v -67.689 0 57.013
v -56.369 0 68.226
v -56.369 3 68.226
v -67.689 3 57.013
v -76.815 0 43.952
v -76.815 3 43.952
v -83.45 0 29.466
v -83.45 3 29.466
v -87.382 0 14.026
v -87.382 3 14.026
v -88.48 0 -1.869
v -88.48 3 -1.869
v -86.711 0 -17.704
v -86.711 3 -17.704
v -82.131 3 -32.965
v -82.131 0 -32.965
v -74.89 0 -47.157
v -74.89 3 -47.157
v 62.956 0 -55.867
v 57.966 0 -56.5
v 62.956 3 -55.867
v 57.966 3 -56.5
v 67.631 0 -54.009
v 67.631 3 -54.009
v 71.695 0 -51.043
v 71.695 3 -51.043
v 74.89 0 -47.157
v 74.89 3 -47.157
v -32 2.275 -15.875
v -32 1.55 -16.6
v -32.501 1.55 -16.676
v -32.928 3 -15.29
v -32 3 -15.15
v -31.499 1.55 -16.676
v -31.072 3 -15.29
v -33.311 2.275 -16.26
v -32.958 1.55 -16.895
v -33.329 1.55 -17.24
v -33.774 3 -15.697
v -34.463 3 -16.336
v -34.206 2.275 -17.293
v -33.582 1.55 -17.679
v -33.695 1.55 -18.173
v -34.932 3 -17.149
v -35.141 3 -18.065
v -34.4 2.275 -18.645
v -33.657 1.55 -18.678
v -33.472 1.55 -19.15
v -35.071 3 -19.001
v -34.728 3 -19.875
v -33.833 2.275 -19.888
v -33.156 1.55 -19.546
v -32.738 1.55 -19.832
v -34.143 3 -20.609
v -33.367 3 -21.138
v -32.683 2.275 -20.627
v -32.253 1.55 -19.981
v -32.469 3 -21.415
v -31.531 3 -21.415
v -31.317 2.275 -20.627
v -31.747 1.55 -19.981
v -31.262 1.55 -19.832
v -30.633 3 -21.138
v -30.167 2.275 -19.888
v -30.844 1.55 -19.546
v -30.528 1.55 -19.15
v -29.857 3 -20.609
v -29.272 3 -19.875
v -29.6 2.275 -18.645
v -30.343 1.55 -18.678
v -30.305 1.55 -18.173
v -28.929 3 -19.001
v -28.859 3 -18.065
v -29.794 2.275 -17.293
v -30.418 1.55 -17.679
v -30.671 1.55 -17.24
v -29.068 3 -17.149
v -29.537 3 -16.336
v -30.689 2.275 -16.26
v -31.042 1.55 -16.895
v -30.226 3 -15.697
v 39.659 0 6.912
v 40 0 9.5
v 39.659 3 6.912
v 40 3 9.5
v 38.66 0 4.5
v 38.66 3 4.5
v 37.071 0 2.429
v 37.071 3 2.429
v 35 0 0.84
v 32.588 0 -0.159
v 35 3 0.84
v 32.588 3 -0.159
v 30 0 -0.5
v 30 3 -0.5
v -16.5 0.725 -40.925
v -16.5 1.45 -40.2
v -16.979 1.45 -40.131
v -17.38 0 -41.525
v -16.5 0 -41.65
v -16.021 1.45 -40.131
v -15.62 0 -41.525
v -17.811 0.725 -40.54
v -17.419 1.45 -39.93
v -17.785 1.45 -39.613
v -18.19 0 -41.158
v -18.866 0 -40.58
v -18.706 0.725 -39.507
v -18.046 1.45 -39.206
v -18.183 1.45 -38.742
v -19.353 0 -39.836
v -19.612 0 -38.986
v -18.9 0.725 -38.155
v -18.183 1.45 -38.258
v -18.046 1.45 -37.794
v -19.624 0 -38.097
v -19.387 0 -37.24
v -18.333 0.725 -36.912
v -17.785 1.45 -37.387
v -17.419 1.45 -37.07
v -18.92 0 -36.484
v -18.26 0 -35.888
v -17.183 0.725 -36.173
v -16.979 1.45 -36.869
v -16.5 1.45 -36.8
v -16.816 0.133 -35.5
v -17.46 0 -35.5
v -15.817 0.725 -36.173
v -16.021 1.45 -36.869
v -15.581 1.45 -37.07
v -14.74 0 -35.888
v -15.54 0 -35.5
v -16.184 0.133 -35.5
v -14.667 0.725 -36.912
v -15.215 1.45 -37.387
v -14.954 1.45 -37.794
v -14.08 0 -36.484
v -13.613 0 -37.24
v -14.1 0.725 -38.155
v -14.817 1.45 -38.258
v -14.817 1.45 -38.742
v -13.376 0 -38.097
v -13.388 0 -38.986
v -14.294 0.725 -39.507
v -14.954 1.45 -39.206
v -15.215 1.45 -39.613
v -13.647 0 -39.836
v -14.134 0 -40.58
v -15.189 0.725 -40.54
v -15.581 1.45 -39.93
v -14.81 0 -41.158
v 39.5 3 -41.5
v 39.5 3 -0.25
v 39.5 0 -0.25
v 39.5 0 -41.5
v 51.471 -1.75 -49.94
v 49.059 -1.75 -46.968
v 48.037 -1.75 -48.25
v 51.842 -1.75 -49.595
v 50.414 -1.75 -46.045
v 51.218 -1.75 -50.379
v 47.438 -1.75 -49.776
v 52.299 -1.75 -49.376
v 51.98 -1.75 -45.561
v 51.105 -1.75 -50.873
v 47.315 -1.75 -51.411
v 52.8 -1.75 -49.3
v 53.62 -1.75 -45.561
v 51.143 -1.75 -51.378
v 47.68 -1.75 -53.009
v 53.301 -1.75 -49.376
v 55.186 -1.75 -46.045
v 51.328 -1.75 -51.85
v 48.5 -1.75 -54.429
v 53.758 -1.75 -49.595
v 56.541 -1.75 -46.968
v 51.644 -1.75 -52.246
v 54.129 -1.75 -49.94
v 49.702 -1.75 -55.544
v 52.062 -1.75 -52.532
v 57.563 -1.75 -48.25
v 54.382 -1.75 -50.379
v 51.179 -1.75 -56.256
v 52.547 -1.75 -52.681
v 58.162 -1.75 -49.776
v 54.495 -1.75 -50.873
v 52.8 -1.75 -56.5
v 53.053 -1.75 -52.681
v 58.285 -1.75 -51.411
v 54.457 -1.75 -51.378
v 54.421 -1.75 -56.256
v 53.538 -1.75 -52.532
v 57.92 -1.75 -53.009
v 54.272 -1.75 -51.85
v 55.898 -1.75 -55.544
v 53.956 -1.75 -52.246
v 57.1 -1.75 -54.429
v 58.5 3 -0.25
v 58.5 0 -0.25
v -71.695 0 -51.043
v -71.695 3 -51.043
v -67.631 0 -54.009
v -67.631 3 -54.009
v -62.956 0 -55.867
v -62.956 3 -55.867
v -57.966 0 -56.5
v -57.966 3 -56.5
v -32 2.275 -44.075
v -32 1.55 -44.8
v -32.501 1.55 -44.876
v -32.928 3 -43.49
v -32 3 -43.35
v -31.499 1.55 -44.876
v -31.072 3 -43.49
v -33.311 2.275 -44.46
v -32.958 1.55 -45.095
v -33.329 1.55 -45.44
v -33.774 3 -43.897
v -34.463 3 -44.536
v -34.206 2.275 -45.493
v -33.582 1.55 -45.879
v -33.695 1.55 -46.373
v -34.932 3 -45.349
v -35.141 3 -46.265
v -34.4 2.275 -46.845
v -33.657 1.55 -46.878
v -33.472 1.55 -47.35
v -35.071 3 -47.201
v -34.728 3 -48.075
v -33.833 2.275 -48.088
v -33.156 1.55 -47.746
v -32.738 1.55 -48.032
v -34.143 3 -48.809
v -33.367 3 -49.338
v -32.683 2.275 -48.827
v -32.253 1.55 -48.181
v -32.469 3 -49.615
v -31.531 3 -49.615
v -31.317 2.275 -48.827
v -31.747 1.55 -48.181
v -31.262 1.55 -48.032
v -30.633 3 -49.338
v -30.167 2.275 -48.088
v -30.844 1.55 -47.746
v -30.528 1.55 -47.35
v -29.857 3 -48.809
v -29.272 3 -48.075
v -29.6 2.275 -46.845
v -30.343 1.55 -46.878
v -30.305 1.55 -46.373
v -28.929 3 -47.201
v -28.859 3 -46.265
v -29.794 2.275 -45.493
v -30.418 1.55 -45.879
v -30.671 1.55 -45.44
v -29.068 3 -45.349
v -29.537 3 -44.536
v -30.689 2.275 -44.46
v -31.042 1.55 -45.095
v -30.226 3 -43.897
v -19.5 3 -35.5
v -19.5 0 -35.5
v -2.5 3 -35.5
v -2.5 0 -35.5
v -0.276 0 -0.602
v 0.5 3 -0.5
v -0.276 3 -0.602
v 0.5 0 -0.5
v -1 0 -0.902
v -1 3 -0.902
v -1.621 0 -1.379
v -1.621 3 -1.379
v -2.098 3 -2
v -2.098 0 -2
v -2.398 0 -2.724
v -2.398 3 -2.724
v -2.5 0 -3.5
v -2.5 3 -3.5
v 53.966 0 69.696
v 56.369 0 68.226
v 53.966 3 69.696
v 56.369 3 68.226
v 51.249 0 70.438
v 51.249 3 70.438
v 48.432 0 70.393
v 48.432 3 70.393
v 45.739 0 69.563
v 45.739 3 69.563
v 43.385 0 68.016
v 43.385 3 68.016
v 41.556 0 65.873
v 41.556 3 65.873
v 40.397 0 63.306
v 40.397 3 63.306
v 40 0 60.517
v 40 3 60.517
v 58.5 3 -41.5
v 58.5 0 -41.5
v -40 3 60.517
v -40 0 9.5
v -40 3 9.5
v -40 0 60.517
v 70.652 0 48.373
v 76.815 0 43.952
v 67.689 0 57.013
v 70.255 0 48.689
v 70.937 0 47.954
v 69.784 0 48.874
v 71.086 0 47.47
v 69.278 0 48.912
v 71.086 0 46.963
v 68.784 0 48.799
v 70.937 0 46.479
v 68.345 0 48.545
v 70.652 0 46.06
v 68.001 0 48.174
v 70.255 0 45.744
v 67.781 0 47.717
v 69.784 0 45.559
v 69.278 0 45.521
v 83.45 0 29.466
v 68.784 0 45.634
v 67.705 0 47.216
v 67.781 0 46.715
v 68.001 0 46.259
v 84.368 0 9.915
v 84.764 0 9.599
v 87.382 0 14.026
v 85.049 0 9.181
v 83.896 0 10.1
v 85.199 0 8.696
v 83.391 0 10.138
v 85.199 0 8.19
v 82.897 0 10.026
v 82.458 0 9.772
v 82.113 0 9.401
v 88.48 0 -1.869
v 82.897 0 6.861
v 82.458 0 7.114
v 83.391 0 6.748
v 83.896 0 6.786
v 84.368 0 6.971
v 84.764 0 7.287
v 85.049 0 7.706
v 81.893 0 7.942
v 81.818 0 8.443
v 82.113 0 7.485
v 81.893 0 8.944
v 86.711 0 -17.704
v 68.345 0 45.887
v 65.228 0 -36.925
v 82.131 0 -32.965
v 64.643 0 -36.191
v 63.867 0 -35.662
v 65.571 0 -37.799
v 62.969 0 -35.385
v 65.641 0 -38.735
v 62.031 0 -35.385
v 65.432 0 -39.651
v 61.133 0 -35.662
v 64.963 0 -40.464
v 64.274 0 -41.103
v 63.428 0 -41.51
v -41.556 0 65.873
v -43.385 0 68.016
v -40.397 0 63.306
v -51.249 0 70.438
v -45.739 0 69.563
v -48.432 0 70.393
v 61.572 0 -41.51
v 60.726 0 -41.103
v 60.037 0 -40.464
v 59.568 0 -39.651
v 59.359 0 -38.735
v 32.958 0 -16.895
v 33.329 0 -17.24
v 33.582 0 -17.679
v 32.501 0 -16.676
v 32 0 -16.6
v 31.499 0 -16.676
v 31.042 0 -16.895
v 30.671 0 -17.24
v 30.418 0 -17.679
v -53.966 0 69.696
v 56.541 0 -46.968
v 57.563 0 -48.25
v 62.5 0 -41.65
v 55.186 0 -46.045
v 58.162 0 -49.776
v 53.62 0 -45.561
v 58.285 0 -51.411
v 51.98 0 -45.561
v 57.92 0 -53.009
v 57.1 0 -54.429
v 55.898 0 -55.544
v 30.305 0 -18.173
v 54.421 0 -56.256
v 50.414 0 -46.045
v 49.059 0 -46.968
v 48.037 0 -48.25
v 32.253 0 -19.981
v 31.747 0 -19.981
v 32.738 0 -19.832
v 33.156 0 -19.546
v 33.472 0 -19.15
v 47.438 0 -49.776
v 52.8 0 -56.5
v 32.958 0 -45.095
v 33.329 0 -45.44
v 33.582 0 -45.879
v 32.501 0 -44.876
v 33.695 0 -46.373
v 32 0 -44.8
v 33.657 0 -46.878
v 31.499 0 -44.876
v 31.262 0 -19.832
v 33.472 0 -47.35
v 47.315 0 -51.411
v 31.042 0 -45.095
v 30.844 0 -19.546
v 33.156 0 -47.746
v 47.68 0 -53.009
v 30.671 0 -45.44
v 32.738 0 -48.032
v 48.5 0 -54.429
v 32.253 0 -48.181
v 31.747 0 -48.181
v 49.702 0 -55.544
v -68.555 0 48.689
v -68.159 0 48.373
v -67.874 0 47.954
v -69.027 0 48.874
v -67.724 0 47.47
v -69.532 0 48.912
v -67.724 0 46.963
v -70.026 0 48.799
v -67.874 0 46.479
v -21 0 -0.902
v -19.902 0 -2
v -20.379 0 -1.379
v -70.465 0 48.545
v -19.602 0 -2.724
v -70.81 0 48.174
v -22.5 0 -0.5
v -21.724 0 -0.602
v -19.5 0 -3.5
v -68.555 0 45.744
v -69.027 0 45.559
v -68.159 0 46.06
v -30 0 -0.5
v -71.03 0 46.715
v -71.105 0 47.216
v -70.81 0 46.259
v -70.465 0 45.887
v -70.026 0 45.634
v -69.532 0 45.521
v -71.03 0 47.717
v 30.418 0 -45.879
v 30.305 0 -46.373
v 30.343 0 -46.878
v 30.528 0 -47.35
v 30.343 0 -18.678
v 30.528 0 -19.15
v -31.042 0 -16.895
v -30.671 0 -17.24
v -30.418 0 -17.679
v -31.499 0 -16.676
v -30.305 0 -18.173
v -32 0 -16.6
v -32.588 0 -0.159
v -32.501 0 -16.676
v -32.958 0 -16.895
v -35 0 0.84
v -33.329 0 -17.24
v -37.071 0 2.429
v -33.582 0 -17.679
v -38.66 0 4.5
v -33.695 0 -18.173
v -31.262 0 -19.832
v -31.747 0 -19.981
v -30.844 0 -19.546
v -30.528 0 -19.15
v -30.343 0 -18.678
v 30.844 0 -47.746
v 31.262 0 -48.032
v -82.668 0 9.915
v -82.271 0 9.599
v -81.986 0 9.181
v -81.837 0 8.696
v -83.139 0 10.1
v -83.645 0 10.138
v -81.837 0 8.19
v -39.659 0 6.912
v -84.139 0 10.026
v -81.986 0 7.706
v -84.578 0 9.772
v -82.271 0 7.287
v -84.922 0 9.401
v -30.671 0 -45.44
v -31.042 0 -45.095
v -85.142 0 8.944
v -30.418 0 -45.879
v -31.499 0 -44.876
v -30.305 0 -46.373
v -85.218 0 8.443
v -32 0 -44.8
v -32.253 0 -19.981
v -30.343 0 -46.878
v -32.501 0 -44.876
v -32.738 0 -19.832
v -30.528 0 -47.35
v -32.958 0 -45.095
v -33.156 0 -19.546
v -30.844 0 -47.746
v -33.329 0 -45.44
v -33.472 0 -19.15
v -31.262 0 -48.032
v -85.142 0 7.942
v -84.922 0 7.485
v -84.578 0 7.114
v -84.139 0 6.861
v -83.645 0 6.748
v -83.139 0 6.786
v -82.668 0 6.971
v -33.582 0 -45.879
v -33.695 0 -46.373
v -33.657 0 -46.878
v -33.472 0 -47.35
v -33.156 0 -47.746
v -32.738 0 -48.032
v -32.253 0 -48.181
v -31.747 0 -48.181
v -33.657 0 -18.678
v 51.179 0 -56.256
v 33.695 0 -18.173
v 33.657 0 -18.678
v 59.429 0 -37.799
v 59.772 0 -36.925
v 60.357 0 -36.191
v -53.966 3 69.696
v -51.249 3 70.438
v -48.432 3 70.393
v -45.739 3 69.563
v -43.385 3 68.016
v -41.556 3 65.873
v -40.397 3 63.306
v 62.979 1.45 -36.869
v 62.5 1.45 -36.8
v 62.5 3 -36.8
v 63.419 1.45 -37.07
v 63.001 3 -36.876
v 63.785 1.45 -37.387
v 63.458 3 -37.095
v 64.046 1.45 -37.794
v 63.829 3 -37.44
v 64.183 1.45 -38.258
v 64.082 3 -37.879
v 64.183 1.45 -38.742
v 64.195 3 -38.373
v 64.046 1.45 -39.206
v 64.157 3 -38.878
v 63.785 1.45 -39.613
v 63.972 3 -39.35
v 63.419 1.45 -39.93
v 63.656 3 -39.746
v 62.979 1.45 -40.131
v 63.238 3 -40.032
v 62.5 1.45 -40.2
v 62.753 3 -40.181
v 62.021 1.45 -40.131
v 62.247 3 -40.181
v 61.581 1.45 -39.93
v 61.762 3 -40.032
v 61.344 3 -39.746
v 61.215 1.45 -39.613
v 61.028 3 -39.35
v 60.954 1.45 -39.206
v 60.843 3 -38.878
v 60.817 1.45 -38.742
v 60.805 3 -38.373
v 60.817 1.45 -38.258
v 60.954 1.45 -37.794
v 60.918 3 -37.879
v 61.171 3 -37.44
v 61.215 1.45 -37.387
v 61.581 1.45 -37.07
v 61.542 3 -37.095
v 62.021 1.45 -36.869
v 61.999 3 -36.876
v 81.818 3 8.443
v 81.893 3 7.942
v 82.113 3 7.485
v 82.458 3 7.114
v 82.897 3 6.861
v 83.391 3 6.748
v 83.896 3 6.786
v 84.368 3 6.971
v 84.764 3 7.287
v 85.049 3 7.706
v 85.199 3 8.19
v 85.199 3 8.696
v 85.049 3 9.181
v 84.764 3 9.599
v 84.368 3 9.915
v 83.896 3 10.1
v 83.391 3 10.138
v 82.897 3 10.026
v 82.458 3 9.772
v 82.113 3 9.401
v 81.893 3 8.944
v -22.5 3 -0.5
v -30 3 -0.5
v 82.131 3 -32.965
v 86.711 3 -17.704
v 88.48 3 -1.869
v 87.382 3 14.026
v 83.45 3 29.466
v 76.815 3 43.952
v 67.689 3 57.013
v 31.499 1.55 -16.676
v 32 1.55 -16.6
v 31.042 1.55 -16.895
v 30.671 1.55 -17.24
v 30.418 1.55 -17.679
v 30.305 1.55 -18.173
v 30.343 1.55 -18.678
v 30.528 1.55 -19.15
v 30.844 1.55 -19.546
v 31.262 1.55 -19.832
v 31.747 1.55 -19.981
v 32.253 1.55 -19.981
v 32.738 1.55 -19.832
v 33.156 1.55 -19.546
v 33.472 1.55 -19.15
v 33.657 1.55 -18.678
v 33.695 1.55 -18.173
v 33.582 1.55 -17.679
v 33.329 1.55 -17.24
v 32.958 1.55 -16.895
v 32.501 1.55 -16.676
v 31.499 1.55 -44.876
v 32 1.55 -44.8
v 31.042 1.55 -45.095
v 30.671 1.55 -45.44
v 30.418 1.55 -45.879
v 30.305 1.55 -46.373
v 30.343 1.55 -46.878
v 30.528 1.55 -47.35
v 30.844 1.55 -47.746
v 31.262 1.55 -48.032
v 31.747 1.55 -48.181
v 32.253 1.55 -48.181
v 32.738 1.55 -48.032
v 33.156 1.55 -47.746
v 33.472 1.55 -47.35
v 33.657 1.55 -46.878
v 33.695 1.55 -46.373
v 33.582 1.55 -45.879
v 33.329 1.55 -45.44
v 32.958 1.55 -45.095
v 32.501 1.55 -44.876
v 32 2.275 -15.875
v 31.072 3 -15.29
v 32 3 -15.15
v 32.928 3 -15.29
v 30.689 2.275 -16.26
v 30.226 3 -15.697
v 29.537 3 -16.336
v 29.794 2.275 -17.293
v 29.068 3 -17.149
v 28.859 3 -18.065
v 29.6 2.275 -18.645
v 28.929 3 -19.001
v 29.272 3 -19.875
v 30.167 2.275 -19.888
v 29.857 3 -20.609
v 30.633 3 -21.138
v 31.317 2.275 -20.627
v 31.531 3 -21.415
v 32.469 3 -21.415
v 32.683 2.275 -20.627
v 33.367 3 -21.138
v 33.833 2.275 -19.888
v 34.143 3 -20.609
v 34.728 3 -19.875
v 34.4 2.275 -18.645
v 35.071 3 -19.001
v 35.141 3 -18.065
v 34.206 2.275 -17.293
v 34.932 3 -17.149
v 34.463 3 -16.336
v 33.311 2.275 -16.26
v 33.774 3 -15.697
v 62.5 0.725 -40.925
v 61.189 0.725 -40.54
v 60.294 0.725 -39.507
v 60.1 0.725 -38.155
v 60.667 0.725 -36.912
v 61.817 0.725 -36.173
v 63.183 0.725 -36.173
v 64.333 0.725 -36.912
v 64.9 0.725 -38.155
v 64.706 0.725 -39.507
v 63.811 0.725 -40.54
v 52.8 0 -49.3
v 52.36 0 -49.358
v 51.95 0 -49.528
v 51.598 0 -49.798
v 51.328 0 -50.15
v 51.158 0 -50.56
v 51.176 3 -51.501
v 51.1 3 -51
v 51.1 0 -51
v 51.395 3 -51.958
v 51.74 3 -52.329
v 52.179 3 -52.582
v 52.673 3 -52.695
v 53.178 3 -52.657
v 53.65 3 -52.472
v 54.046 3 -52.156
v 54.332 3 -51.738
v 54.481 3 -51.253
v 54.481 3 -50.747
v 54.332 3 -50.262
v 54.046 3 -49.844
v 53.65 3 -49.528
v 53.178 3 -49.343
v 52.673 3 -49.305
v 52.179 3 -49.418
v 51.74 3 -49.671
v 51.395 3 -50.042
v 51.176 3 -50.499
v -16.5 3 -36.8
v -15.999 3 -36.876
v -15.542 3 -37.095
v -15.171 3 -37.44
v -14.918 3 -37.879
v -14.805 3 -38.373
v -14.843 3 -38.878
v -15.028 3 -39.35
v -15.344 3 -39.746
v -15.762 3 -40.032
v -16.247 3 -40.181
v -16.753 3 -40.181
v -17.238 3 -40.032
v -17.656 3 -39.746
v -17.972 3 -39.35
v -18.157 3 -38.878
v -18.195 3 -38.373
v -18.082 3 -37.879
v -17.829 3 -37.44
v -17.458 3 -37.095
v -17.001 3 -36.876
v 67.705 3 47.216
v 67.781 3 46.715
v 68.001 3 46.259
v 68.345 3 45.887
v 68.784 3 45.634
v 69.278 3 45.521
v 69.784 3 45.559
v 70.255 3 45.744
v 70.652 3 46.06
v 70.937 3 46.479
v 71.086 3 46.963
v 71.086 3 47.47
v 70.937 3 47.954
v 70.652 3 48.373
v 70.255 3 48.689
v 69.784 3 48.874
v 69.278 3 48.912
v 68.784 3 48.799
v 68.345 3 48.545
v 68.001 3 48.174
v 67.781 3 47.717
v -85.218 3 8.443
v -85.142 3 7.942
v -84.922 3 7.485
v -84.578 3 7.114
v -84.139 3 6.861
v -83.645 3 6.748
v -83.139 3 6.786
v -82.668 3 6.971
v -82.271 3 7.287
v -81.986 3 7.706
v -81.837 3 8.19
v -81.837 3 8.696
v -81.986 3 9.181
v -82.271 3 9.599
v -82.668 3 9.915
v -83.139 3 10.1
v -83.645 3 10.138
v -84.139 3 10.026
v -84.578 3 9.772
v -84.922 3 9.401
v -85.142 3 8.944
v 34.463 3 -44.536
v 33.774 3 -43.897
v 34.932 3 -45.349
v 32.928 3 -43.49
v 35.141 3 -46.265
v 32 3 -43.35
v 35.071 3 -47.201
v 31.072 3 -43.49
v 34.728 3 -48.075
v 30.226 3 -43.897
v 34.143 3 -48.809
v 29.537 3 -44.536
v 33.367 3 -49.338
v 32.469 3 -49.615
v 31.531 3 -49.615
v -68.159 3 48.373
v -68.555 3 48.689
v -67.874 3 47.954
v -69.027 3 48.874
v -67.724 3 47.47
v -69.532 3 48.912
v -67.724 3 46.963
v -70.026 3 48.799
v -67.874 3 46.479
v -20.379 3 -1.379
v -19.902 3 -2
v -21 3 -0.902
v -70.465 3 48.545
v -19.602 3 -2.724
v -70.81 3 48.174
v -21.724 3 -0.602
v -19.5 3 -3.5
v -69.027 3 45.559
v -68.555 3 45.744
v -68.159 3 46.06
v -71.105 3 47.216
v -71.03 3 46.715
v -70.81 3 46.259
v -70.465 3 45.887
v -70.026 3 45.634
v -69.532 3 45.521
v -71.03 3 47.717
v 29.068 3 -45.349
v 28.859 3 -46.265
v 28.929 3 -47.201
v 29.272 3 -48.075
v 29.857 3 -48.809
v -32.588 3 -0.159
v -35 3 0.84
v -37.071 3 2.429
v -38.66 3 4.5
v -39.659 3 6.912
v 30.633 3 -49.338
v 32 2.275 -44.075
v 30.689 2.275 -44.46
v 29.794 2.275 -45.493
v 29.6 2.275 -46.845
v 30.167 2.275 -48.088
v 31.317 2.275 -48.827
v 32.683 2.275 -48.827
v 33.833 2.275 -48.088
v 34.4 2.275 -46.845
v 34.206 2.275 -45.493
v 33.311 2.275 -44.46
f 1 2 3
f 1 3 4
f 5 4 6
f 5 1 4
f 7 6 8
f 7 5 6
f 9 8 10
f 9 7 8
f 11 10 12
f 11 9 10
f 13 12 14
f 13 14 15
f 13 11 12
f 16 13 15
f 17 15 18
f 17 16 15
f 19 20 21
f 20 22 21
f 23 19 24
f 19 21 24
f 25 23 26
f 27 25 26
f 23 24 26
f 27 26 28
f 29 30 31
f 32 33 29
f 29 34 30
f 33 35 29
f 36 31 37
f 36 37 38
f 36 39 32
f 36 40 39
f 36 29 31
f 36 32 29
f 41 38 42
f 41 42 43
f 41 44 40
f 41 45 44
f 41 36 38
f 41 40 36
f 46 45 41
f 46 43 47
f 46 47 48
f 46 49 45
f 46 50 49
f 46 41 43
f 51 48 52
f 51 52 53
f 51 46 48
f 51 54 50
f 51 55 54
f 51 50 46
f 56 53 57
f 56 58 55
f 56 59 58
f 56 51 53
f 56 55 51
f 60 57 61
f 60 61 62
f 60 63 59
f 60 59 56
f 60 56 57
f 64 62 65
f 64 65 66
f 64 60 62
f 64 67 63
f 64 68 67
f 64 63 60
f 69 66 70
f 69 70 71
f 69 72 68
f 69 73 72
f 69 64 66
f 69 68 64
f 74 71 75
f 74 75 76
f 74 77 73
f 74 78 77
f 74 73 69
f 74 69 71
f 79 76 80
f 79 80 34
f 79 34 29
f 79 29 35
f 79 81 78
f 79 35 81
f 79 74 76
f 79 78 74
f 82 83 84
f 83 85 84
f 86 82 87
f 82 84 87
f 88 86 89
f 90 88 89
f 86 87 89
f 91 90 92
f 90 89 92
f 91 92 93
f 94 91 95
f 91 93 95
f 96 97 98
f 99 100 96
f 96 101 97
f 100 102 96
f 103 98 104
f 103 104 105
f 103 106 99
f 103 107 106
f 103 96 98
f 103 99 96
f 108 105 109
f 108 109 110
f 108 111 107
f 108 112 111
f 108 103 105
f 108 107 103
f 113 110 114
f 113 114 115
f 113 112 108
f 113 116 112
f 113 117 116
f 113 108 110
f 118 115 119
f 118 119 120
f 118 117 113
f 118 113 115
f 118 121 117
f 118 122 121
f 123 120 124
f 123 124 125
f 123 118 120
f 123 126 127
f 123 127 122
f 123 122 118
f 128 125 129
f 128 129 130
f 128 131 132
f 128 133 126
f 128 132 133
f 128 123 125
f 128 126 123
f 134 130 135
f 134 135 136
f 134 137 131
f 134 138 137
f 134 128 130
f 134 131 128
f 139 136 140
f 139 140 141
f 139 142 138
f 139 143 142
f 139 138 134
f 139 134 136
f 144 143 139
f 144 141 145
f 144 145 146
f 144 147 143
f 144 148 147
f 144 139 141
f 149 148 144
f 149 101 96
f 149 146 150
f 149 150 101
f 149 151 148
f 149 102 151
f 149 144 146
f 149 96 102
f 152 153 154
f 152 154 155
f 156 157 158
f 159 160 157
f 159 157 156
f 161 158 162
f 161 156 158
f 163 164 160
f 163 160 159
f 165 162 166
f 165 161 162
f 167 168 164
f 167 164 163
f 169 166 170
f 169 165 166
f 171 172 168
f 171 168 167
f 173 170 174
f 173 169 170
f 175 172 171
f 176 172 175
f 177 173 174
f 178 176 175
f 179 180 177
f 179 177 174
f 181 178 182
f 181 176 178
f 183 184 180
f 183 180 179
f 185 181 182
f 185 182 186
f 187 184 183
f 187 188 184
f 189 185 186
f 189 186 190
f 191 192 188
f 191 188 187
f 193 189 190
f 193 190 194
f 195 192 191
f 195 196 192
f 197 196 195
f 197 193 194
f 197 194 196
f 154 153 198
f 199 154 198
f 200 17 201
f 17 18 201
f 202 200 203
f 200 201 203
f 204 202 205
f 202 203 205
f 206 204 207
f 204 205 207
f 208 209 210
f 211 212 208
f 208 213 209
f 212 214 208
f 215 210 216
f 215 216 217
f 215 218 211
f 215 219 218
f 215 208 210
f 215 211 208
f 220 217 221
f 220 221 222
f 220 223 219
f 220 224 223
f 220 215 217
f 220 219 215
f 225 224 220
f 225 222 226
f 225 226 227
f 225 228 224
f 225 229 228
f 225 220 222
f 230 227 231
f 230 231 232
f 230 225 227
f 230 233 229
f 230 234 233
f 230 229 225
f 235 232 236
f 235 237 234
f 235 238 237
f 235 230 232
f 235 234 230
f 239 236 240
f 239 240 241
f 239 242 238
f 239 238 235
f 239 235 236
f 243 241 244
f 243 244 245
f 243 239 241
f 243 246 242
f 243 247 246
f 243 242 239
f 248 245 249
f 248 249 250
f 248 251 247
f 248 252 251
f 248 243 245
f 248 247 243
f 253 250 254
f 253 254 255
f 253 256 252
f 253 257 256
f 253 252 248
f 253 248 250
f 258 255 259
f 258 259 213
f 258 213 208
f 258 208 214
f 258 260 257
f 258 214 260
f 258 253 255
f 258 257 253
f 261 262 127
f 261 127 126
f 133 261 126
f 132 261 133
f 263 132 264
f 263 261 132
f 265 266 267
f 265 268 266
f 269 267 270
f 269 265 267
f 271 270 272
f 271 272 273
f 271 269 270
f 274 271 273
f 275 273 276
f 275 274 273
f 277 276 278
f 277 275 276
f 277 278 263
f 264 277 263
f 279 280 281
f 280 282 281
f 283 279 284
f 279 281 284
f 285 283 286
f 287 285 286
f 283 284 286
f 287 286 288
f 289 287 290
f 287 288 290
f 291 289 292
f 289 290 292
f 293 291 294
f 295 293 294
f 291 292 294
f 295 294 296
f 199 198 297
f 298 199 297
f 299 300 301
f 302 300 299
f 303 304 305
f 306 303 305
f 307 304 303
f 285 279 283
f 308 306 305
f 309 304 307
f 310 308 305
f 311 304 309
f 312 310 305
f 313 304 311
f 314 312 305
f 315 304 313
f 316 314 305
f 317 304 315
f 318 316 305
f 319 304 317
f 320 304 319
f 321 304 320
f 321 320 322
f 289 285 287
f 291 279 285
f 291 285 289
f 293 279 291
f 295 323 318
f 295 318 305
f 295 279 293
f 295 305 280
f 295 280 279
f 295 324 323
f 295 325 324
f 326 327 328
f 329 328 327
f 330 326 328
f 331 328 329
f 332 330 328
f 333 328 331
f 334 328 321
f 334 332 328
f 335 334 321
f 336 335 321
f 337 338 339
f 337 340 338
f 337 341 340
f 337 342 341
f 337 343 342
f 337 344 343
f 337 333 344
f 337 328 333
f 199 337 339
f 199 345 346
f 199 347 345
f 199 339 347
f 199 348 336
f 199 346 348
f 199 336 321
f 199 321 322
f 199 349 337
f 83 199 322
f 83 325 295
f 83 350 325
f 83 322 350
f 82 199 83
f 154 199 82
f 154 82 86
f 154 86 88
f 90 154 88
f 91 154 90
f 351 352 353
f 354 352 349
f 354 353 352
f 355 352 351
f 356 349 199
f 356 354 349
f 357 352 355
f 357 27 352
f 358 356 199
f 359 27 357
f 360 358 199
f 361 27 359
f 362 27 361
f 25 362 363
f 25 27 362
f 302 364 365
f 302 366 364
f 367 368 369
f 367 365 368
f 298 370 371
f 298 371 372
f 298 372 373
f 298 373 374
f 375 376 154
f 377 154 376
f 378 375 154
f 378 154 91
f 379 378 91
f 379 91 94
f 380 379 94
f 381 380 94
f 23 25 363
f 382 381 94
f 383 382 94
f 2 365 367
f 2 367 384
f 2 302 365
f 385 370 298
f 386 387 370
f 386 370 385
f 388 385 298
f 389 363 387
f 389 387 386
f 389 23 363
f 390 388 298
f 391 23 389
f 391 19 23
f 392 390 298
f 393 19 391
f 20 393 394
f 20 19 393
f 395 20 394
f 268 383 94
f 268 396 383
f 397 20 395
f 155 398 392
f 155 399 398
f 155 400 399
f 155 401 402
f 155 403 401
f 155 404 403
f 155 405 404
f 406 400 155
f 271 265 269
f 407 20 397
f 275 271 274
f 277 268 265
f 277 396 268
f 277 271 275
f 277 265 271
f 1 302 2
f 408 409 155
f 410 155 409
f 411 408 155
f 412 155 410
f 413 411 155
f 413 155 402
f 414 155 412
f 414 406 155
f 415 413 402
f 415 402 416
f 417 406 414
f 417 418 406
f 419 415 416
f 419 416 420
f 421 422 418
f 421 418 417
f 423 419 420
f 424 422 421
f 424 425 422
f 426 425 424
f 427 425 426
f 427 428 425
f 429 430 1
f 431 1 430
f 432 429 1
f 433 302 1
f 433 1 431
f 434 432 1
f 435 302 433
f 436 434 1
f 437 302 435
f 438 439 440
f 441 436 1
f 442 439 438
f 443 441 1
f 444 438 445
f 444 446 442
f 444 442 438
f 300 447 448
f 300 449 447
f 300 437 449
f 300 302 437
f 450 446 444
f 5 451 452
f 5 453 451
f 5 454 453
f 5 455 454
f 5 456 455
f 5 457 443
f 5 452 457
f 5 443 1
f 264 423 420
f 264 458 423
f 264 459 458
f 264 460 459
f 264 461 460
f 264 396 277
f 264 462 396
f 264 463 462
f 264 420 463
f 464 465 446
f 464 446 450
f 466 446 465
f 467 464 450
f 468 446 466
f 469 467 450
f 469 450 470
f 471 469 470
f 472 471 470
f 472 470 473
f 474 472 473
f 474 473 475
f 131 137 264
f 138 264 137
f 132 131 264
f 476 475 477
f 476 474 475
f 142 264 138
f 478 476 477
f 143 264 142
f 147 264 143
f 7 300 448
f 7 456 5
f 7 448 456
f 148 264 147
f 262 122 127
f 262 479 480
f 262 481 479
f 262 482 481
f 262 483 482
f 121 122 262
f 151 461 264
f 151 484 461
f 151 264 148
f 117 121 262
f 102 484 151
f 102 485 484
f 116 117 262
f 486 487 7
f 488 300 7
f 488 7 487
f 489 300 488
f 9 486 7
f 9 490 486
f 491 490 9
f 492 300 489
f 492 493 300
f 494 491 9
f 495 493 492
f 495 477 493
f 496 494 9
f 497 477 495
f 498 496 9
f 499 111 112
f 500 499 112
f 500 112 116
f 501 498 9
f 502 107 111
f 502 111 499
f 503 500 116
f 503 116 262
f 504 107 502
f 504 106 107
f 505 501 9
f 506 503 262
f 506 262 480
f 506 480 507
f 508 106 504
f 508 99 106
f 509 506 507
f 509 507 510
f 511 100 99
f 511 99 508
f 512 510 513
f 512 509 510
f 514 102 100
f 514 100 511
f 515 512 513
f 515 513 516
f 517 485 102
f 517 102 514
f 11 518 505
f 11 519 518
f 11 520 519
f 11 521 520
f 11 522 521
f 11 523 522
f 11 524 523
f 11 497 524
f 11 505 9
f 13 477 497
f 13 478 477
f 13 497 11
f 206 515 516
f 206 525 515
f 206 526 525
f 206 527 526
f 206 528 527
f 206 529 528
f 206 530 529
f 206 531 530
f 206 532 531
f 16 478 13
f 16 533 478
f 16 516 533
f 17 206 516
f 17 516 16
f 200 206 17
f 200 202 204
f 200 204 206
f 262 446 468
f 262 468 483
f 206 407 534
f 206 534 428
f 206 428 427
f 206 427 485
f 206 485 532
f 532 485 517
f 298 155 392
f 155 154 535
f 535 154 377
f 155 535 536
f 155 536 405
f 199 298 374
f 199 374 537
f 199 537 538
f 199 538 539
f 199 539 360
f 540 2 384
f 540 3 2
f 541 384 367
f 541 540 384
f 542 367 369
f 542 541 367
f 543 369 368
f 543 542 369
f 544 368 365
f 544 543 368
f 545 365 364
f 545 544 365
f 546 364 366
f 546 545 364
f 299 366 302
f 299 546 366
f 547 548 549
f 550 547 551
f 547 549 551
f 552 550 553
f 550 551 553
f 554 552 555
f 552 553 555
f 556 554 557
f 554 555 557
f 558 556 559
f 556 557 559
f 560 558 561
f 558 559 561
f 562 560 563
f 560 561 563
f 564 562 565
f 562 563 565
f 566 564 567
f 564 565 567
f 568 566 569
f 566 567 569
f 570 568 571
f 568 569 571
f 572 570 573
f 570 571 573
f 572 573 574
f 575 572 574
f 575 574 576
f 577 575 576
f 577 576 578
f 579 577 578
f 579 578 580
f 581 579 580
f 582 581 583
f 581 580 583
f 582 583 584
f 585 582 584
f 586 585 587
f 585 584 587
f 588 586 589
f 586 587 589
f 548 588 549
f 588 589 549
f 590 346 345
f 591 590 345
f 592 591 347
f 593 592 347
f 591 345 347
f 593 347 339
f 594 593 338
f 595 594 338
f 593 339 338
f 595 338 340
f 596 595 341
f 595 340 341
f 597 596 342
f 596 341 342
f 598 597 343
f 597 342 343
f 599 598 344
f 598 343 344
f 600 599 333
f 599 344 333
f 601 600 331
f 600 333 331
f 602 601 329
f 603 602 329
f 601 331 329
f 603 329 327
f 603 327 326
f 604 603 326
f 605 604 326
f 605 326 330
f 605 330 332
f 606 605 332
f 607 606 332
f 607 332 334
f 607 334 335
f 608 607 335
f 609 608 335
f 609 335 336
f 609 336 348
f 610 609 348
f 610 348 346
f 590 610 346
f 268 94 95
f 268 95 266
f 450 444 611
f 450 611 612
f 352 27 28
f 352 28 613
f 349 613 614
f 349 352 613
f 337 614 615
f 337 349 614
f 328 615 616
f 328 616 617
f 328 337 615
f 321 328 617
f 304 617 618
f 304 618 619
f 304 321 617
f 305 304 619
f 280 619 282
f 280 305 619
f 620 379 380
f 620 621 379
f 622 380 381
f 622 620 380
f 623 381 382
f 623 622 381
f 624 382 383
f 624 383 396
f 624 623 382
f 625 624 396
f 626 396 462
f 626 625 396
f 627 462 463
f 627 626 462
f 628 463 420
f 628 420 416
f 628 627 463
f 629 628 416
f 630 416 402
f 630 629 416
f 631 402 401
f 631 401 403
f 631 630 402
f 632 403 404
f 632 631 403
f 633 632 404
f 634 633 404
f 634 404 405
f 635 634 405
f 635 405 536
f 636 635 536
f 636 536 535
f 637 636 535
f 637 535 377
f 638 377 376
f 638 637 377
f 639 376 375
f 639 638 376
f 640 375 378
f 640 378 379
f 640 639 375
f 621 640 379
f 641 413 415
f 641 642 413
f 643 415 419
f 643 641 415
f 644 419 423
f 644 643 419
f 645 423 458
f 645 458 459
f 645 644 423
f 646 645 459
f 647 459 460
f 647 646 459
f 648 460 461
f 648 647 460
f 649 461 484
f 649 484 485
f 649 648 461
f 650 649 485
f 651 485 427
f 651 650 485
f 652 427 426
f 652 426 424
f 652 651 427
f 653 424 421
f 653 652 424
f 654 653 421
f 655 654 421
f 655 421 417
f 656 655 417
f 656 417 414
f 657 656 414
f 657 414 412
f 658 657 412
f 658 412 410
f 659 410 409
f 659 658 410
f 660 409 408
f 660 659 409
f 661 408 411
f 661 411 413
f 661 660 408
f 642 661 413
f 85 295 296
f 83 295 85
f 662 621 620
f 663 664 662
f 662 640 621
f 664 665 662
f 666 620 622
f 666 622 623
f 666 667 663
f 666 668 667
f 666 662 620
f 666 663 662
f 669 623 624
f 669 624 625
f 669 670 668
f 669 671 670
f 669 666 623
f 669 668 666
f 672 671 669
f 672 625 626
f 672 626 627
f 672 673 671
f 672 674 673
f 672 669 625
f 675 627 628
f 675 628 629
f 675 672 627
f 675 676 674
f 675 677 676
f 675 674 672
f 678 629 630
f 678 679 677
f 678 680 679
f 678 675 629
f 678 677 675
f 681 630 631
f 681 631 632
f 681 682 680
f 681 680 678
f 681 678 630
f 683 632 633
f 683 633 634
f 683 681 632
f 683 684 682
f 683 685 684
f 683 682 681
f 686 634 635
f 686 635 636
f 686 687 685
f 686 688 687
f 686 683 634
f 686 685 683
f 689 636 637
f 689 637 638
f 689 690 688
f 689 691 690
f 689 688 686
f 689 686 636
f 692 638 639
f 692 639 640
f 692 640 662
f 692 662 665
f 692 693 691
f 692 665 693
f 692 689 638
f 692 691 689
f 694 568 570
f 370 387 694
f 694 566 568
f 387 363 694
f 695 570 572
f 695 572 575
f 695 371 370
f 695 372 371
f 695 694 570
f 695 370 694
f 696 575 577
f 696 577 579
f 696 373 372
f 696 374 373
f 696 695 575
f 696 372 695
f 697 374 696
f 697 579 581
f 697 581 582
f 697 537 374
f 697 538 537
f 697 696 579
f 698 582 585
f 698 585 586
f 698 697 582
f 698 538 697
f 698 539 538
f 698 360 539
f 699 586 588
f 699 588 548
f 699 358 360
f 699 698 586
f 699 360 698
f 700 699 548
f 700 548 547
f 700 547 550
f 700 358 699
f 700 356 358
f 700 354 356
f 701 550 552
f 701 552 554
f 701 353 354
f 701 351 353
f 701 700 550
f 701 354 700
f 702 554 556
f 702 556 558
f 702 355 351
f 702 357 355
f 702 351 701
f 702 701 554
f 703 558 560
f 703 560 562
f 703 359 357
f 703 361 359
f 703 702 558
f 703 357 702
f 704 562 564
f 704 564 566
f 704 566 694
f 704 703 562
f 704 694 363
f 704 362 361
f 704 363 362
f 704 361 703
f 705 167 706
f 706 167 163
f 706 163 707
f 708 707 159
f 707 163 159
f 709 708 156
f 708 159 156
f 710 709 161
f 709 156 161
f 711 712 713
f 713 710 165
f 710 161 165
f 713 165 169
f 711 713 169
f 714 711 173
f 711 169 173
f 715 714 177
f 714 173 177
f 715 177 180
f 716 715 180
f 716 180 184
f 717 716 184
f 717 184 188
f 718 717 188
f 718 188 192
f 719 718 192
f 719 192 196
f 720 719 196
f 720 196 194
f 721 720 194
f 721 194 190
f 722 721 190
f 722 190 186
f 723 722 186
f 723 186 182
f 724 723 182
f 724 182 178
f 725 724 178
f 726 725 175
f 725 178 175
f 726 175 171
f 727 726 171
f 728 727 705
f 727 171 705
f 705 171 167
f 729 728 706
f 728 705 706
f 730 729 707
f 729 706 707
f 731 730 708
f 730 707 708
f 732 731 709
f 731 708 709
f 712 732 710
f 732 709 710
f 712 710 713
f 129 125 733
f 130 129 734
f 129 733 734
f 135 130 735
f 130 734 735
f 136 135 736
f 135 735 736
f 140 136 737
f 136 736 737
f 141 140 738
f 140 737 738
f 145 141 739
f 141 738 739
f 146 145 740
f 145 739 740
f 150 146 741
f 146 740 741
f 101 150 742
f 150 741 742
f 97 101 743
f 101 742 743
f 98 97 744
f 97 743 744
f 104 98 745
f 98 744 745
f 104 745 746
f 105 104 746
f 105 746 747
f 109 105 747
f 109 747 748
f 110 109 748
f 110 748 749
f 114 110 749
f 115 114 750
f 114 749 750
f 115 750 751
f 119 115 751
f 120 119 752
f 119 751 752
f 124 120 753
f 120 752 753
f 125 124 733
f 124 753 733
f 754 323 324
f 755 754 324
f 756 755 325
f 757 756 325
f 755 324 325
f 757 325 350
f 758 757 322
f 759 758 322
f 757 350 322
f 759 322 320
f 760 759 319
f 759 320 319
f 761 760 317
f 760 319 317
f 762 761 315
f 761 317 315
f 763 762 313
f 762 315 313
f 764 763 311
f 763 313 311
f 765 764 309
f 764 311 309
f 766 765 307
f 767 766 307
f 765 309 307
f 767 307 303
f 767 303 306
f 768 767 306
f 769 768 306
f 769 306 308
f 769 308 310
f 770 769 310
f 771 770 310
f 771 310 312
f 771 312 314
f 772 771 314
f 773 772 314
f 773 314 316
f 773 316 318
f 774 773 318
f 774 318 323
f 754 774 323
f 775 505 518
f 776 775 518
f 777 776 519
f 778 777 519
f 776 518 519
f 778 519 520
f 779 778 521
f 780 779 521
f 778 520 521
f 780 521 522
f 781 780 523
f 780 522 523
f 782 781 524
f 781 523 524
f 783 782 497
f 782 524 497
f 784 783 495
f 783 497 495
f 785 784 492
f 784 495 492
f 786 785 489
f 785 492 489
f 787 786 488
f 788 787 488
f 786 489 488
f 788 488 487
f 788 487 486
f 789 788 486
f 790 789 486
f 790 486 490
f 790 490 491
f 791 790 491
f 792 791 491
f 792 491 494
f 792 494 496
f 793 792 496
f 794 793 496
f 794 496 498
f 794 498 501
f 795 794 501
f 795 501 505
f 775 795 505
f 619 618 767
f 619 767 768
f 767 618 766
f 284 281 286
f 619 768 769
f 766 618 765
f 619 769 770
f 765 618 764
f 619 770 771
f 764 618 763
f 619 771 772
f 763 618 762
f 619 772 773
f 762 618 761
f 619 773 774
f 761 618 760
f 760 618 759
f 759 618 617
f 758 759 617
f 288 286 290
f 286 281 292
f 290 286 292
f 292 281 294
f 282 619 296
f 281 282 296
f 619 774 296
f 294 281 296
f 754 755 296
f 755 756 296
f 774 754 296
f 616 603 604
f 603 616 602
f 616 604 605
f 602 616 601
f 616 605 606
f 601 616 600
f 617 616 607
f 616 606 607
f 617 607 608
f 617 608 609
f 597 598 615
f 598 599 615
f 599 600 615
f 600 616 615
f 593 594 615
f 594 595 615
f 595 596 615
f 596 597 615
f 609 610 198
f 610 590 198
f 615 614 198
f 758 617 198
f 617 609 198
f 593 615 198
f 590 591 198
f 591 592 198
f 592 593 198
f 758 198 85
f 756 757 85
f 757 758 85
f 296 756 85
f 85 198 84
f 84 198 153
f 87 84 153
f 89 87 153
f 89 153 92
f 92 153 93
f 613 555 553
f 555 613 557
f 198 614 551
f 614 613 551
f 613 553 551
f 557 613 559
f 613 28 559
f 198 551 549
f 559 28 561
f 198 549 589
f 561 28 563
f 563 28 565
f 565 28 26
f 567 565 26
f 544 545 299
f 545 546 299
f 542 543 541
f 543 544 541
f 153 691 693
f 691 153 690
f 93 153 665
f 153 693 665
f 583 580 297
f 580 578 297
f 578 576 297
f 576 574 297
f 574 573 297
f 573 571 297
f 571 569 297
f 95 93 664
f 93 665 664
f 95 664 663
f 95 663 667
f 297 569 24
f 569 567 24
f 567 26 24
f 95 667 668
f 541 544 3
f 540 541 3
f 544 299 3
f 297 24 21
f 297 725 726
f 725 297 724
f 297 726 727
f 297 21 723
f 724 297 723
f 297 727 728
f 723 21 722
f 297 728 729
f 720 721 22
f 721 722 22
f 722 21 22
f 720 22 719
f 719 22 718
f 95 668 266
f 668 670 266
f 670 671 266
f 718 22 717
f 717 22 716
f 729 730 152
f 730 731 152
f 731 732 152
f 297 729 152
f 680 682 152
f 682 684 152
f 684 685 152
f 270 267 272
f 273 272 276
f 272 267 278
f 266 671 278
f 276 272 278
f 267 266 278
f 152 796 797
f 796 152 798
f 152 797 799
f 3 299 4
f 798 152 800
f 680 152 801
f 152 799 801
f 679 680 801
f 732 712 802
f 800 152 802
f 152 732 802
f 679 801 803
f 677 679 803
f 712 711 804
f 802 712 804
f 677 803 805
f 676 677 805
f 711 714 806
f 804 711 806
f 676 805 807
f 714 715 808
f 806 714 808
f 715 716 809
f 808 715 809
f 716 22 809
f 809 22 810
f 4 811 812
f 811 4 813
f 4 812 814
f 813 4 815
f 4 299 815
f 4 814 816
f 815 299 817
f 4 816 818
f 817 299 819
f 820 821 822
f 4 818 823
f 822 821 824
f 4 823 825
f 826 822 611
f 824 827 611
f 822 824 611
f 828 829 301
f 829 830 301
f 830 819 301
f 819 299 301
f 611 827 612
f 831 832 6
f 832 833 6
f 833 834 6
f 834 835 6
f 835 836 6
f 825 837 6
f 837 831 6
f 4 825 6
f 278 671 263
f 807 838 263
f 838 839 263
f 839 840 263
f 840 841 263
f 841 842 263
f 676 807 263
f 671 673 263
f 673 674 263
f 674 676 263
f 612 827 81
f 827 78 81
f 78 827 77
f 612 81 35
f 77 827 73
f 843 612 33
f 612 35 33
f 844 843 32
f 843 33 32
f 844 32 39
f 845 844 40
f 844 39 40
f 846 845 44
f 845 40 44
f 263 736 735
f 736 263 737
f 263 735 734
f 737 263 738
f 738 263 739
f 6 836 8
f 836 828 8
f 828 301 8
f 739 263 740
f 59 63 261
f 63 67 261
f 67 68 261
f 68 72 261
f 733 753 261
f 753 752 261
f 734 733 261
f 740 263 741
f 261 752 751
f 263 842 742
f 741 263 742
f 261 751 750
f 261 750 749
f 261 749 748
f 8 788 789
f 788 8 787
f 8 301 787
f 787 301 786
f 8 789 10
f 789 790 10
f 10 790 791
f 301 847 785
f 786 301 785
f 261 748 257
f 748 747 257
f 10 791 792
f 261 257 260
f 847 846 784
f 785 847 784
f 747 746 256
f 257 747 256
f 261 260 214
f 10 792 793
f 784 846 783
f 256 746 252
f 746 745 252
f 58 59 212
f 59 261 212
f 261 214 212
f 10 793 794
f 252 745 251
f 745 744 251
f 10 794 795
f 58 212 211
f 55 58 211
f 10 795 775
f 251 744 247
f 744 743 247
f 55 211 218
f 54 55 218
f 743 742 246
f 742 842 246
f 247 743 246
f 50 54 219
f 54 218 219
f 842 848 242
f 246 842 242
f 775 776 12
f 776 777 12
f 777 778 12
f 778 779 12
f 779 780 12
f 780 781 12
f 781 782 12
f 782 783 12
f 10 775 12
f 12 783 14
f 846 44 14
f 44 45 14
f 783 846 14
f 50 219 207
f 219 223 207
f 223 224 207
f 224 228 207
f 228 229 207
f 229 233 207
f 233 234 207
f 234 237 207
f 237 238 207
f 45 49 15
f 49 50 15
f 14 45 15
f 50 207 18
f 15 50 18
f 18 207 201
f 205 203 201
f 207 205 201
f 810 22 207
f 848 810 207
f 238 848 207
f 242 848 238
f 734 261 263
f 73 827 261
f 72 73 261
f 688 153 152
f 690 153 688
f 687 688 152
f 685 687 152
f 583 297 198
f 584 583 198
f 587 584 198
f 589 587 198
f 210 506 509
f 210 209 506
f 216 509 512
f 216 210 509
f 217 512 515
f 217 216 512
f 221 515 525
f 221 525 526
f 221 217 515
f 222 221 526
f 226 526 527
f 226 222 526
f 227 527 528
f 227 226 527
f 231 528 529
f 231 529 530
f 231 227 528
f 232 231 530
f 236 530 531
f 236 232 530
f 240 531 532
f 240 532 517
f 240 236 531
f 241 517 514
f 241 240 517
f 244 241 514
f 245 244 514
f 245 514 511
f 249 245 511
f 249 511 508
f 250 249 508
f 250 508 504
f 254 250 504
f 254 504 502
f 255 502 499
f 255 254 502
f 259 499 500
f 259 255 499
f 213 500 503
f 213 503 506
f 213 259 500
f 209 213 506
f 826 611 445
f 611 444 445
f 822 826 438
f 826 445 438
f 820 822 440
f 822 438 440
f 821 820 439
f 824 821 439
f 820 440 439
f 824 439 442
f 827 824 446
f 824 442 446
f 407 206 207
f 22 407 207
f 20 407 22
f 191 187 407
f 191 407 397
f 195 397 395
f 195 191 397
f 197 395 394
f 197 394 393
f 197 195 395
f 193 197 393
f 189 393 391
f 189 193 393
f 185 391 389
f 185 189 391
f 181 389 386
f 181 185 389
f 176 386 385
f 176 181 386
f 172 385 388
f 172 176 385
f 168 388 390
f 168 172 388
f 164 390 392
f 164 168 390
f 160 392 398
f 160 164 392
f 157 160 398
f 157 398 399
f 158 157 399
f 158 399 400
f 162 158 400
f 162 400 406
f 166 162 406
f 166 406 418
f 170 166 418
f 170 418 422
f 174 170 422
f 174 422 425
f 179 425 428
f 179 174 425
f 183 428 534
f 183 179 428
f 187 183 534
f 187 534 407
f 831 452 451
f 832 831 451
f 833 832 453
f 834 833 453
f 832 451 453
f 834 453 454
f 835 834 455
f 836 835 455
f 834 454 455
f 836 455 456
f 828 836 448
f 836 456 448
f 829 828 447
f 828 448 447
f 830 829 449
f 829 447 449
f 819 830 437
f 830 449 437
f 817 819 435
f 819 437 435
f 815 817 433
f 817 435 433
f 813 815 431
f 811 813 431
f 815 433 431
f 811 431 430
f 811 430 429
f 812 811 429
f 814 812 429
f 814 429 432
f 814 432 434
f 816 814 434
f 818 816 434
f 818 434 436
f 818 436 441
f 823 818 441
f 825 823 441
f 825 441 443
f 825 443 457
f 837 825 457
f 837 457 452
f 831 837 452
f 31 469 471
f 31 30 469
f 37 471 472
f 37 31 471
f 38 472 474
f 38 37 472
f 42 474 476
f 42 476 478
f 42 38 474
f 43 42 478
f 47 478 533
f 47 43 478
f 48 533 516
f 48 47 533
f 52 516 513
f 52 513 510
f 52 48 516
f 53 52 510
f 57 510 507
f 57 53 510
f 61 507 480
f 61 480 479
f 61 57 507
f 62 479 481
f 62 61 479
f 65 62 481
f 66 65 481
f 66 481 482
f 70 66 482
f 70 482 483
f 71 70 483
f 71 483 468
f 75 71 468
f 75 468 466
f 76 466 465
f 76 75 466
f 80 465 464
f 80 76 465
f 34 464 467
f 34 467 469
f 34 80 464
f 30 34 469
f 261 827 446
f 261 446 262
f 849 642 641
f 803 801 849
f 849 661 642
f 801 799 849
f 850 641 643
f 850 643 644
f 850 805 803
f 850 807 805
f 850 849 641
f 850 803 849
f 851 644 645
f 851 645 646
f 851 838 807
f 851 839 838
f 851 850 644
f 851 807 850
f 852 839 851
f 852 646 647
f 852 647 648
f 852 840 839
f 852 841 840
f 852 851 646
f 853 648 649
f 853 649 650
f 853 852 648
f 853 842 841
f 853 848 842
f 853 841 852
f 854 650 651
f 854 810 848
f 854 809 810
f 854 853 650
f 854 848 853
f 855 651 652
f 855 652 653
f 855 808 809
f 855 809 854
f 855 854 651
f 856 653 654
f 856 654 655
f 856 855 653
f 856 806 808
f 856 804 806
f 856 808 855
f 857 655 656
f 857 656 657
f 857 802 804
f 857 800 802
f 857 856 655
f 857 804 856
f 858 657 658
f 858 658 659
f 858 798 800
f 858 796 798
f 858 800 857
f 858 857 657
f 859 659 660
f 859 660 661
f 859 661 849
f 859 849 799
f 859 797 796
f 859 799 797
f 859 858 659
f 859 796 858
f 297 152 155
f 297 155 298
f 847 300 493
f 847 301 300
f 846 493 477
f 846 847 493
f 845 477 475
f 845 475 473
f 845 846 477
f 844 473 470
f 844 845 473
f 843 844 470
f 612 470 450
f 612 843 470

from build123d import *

# Parameters (mm, degrees)
BOSS_EXTRUDE1_DEPTH                            = 3
F_3_4_3_4_DIAMETER_HOLE2_D                     = 3.4
CSK_FOR_M3_FLAT_HEAD_MACHINE_SCREW1_AT_2_COUNT = 2
CSK_FOR_M3_FLAT_HEAD_MACHINE_SCREW1_AT_2_PITCH = 28.2
CSK_FOR_M3_FLAT_HEAD_MACHINE_SCREW1_AT_3_COUNT = 2
CSK_FOR_M3_FLAT_HEAD_MACHINE_SCREW1_AT_3_PITCH = 64
CSK_FOR_M3_FLAT_HEAD_MACHINE_SCREW1_AT_4_COUNT = 2
CSK_FOR_M3_FLAT_HEAD_MACHINE_SCREW1_AT_4_PITCH = 69.937400581
CUT_EXTRUDE1_DEPTH                             = 126.193849689
CUT_EXTRUDE1_DEPTH_BACK                        = 10
FILLET1_R                                      = 10
BOSS_EXTRUDE3_START                            = 1.75
SKETCH9_R                                      = 5.5
SKETCH9_R_2                                    = 1.7
BOSS_EXTRUDE3_DEPTH                            = 1.75
SKETCH12_W                                     = 17
SKETCH12_H                                     = 35
SKETCH12_W_2                                   = 19
SKETCH12_H_2                                   = 41.25
SKETCH12_R                                     = 1.7
CUT_EXTRUDE2_DEPTH                             = 114.258081537
CSK_FOR_M3_FLAT_HEAD_MACHINE_SCREW2_AT_2_COUNT = 2
CSK_FOR_M3_FLAT_HEAD_MACHINE_SCREW2_AT_2_PITCH = 79
FILLET2_R                                      = 20
FILLET3_R                                      = 3


with BuildPart() as part:
    # Sketch1 → Boss-Extrude1 (new body)
    with BuildSketch(Plane(origin=(0, 0, 0), x_dir=(1, 0, 0), z_dir=(0, 1, 0))):
        with BuildLine():
            Line((-68.117545464, 56.5), (68.117545464, 56.5))
            ThreePointArc((68.117545464, 56.5), (0, -88.5), (-68.117545464, 56.5))
        make_face()
    extrude(amount=BOSS_EXTRUDE1_DEPTH)

    # Ø3.4 (3.4) Diameter Hole2 (through all)
    with Locations(Plane(origin=(0, 3, 0), x_dir=(1, 0, 0), z_dir=(0, 1, 0))):
        with Locations((69.405322414, -47.216282822), (-83.517603132, -8.443110213), (-69.405322414, -47.216282822), (52.8, 51), (83.517603132, -8.443110213)):
            Hole(F_3_4_3_4_DIAMETER_HOLE2_D / 2)

    # Sketch6 → CSK for M3 Flat Head Machine Screw1 (revolve, cut)
    with BuildSketch(Plane(origin=(32, 3, -46.5), x_dir=(0, 0, 1), z_dir=(1, 0, 0))):
        Polygon((0, 0), (0, 3), (1.7, 3), (1.7, 1.45), (3.15, 0), align=None)
    csk_for_m3_flat_head_machine_screw1 = revolve(axis=Axis((32, 9.35, -46.5), (0, -1, 0)), mode=Mode.SUBTRACT)

    # CSK for M3 Flat Head Machine Screw1 at 2: CSK for M3 Flat Head Machine Screw1 ×2
    with Locations(*[(0, 0, i * CSK_FOR_M3_FLAT_HEAD_MACHINE_SCREW1_AT_2_PITCH) for i in range(1, CSK_FOR_M3_FLAT_HEAD_MACHINE_SCREW1_AT_2_COUNT)]):
        add(csk_for_m3_flat_head_machine_screw1, mode=Mode.SUBTRACT)

    # CSK for M3 Flat Head Machine Screw1 at 3: CSK for M3 Flat Head Machine Screw1 ×2
    with Locations(*[(-i * CSK_FOR_M3_FLAT_HEAD_MACHINE_SCREW1_AT_3_PITCH, 0, 0) for i in range(1, CSK_FOR_M3_FLAT_HEAD_MACHINE_SCREW1_AT_3_COUNT)]):
        add(csk_for_m3_flat_head_machine_screw1, mode=Mode.SUBTRACT)

    # CSK for M3 Flat Head Machine Screw1 at 4: CSK for M3 Flat Head Machine Screw1 ×2
    with Locations(*[Vector(-0.9151040711908488, 0, 0.4032177313684679) * (i * CSK_FOR_M3_FLAT_HEAD_MACHINE_SCREW1_AT_4_PITCH) for i in range(1, CSK_FOR_M3_FLAT_HEAD_MACHINE_SCREW1_AT_4_COUNT)]):
        add(csk_for_m3_flat_head_machine_screw1, mode=Mode.SUBTRACT)

    # Sketch7 → Cut-Extrude1 (cut, two sides: drawn at the far end of the back side and taken through both)
    with BuildSketch(Plane(origin=(0, 3, 0), x_dir=(1, 0, 0), z_dir=(0, 1, 0)).offset(-CUT_EXTRUDE1_DEPTH_BACK)):
        with BuildLine():
            Line((40, -78.944600829), (40, 0.5))
            Line((40, 0.5), (-40, 0.5))
            Line((-40, 0.5), (-40, -78.944600829))
            ThreePointArc((-40, -78.944600829), (0, -88.5), (40, -78.944600829))
        make_face()
    extrude(amount=CUT_EXTRUDE1_DEPTH + CUT_EXTRUDE1_DEPTH_BACK, mode=Mode.SUBTRACT)

    # Fillet1
    fillet1_edges = [part.edges().sort_by_distance(p)[0] for p in [
        (40, 1.5, 78.944600829),
        (-40, 1.5, 78.944600829),
        (40, 1.5, -0.5),
        (-40, 1.5, -0.5),
    ]]
    fillet(fillet1_edges, radius=FILLET1_R)

    # Sketch9 → Boss-Extrude3 (add)
    with BuildSketch(Plane.XZ.offset(BOSS_EXTRUDE3_START)):
        with Locations(Location((52.8, -51, 0), (0, 0, 270))):
            Circle(SKETCH9_R)
        with Locations(Location((52.8, -51, 0), (0, 0, 90))):
            Circle(SKETCH9_R_2, mode=Mode.SUBTRACT)
    extrude(amount=-BOSS_EXTRUDE3_DEPTH)

    # Sketch12 → Cut-Extrude2 (cut, through all)
    with BuildSketch(Plane(origin=(0, 3, 0), x_dir=(1, 0, 0), z_dir=(0, 1, 0))):
        with Locations((-11, 18)):
            Rectangle(SKETCH12_W, SKETCH12_H)
        with Locations((49, 20.875)):
            Rectangle(SKETCH12_W_2, SKETCH12_H_2)
        with Locations(Location((-16.5, 38.5, 0), (0, 0, 270))):
            Circle(SKETCH12_R)
        with Locations(Location((62.5, 38.5, 0), (0, 0, 270))):
            Circle(SKETCH12_R)
    extrude(amount=-CUT_EXTRUDE2_DEPTH, mode=Mode.SUBTRACT)

    # Sketch13 → CSK for M3 Flat Head Machine Screw2 (revolve, cut)
    with BuildSketch(Plane(origin=(62.5, 0, -38.5), x_dir=(0, 0, -1), z_dir=(1, 0, 0))):
        Polygon((0, 0), (0, 3), (1.7, 3), (1.7, 1.45), (3.15, 0), align=None)
    csk_for_m3_flat_head_machine_screw2 = revolve(axis=Axis((62.5, -6.35, -38.5), (0, 1, 0)), mode=Mode.SUBTRACT)

    # CSK for M3 Flat Head Machine Screw2 at 2: CSK for M3 Flat Head Machine Screw2 ×2
    with Locations(*[(-i * CSK_FOR_M3_FLAT_HEAD_MACHINE_SCREW2_AT_2_PITCH, 0, 0) for i in range(1, CSK_FOR_M3_FLAT_HEAD_MACHINE_SCREW2_AT_2_COUNT)]):
        add(csk_for_m3_flat_head_machine_screw2, mode=Mode.SUBTRACT)

    # Fillet2
    fillet2_edges = [part.edges().sort_by_distance(p)[0] for p in [
        (-68.117545464, 1.5, -56.5),
        (68.117545464, 1.5, -56.5),
    ]]
    fillet(fillet2_edges, radius=FILLET2_R)

    # Fillet3
    fillet3_edges = [part.edges().sort_by_distance(p)[0] for p in [
        (-19.5, 1.5, -0.5),
        (-2.5, 1.5, -0.5),
    ]]
    fillet(fillet3_edges, radius=FILLET3_R)


solid = part.part
